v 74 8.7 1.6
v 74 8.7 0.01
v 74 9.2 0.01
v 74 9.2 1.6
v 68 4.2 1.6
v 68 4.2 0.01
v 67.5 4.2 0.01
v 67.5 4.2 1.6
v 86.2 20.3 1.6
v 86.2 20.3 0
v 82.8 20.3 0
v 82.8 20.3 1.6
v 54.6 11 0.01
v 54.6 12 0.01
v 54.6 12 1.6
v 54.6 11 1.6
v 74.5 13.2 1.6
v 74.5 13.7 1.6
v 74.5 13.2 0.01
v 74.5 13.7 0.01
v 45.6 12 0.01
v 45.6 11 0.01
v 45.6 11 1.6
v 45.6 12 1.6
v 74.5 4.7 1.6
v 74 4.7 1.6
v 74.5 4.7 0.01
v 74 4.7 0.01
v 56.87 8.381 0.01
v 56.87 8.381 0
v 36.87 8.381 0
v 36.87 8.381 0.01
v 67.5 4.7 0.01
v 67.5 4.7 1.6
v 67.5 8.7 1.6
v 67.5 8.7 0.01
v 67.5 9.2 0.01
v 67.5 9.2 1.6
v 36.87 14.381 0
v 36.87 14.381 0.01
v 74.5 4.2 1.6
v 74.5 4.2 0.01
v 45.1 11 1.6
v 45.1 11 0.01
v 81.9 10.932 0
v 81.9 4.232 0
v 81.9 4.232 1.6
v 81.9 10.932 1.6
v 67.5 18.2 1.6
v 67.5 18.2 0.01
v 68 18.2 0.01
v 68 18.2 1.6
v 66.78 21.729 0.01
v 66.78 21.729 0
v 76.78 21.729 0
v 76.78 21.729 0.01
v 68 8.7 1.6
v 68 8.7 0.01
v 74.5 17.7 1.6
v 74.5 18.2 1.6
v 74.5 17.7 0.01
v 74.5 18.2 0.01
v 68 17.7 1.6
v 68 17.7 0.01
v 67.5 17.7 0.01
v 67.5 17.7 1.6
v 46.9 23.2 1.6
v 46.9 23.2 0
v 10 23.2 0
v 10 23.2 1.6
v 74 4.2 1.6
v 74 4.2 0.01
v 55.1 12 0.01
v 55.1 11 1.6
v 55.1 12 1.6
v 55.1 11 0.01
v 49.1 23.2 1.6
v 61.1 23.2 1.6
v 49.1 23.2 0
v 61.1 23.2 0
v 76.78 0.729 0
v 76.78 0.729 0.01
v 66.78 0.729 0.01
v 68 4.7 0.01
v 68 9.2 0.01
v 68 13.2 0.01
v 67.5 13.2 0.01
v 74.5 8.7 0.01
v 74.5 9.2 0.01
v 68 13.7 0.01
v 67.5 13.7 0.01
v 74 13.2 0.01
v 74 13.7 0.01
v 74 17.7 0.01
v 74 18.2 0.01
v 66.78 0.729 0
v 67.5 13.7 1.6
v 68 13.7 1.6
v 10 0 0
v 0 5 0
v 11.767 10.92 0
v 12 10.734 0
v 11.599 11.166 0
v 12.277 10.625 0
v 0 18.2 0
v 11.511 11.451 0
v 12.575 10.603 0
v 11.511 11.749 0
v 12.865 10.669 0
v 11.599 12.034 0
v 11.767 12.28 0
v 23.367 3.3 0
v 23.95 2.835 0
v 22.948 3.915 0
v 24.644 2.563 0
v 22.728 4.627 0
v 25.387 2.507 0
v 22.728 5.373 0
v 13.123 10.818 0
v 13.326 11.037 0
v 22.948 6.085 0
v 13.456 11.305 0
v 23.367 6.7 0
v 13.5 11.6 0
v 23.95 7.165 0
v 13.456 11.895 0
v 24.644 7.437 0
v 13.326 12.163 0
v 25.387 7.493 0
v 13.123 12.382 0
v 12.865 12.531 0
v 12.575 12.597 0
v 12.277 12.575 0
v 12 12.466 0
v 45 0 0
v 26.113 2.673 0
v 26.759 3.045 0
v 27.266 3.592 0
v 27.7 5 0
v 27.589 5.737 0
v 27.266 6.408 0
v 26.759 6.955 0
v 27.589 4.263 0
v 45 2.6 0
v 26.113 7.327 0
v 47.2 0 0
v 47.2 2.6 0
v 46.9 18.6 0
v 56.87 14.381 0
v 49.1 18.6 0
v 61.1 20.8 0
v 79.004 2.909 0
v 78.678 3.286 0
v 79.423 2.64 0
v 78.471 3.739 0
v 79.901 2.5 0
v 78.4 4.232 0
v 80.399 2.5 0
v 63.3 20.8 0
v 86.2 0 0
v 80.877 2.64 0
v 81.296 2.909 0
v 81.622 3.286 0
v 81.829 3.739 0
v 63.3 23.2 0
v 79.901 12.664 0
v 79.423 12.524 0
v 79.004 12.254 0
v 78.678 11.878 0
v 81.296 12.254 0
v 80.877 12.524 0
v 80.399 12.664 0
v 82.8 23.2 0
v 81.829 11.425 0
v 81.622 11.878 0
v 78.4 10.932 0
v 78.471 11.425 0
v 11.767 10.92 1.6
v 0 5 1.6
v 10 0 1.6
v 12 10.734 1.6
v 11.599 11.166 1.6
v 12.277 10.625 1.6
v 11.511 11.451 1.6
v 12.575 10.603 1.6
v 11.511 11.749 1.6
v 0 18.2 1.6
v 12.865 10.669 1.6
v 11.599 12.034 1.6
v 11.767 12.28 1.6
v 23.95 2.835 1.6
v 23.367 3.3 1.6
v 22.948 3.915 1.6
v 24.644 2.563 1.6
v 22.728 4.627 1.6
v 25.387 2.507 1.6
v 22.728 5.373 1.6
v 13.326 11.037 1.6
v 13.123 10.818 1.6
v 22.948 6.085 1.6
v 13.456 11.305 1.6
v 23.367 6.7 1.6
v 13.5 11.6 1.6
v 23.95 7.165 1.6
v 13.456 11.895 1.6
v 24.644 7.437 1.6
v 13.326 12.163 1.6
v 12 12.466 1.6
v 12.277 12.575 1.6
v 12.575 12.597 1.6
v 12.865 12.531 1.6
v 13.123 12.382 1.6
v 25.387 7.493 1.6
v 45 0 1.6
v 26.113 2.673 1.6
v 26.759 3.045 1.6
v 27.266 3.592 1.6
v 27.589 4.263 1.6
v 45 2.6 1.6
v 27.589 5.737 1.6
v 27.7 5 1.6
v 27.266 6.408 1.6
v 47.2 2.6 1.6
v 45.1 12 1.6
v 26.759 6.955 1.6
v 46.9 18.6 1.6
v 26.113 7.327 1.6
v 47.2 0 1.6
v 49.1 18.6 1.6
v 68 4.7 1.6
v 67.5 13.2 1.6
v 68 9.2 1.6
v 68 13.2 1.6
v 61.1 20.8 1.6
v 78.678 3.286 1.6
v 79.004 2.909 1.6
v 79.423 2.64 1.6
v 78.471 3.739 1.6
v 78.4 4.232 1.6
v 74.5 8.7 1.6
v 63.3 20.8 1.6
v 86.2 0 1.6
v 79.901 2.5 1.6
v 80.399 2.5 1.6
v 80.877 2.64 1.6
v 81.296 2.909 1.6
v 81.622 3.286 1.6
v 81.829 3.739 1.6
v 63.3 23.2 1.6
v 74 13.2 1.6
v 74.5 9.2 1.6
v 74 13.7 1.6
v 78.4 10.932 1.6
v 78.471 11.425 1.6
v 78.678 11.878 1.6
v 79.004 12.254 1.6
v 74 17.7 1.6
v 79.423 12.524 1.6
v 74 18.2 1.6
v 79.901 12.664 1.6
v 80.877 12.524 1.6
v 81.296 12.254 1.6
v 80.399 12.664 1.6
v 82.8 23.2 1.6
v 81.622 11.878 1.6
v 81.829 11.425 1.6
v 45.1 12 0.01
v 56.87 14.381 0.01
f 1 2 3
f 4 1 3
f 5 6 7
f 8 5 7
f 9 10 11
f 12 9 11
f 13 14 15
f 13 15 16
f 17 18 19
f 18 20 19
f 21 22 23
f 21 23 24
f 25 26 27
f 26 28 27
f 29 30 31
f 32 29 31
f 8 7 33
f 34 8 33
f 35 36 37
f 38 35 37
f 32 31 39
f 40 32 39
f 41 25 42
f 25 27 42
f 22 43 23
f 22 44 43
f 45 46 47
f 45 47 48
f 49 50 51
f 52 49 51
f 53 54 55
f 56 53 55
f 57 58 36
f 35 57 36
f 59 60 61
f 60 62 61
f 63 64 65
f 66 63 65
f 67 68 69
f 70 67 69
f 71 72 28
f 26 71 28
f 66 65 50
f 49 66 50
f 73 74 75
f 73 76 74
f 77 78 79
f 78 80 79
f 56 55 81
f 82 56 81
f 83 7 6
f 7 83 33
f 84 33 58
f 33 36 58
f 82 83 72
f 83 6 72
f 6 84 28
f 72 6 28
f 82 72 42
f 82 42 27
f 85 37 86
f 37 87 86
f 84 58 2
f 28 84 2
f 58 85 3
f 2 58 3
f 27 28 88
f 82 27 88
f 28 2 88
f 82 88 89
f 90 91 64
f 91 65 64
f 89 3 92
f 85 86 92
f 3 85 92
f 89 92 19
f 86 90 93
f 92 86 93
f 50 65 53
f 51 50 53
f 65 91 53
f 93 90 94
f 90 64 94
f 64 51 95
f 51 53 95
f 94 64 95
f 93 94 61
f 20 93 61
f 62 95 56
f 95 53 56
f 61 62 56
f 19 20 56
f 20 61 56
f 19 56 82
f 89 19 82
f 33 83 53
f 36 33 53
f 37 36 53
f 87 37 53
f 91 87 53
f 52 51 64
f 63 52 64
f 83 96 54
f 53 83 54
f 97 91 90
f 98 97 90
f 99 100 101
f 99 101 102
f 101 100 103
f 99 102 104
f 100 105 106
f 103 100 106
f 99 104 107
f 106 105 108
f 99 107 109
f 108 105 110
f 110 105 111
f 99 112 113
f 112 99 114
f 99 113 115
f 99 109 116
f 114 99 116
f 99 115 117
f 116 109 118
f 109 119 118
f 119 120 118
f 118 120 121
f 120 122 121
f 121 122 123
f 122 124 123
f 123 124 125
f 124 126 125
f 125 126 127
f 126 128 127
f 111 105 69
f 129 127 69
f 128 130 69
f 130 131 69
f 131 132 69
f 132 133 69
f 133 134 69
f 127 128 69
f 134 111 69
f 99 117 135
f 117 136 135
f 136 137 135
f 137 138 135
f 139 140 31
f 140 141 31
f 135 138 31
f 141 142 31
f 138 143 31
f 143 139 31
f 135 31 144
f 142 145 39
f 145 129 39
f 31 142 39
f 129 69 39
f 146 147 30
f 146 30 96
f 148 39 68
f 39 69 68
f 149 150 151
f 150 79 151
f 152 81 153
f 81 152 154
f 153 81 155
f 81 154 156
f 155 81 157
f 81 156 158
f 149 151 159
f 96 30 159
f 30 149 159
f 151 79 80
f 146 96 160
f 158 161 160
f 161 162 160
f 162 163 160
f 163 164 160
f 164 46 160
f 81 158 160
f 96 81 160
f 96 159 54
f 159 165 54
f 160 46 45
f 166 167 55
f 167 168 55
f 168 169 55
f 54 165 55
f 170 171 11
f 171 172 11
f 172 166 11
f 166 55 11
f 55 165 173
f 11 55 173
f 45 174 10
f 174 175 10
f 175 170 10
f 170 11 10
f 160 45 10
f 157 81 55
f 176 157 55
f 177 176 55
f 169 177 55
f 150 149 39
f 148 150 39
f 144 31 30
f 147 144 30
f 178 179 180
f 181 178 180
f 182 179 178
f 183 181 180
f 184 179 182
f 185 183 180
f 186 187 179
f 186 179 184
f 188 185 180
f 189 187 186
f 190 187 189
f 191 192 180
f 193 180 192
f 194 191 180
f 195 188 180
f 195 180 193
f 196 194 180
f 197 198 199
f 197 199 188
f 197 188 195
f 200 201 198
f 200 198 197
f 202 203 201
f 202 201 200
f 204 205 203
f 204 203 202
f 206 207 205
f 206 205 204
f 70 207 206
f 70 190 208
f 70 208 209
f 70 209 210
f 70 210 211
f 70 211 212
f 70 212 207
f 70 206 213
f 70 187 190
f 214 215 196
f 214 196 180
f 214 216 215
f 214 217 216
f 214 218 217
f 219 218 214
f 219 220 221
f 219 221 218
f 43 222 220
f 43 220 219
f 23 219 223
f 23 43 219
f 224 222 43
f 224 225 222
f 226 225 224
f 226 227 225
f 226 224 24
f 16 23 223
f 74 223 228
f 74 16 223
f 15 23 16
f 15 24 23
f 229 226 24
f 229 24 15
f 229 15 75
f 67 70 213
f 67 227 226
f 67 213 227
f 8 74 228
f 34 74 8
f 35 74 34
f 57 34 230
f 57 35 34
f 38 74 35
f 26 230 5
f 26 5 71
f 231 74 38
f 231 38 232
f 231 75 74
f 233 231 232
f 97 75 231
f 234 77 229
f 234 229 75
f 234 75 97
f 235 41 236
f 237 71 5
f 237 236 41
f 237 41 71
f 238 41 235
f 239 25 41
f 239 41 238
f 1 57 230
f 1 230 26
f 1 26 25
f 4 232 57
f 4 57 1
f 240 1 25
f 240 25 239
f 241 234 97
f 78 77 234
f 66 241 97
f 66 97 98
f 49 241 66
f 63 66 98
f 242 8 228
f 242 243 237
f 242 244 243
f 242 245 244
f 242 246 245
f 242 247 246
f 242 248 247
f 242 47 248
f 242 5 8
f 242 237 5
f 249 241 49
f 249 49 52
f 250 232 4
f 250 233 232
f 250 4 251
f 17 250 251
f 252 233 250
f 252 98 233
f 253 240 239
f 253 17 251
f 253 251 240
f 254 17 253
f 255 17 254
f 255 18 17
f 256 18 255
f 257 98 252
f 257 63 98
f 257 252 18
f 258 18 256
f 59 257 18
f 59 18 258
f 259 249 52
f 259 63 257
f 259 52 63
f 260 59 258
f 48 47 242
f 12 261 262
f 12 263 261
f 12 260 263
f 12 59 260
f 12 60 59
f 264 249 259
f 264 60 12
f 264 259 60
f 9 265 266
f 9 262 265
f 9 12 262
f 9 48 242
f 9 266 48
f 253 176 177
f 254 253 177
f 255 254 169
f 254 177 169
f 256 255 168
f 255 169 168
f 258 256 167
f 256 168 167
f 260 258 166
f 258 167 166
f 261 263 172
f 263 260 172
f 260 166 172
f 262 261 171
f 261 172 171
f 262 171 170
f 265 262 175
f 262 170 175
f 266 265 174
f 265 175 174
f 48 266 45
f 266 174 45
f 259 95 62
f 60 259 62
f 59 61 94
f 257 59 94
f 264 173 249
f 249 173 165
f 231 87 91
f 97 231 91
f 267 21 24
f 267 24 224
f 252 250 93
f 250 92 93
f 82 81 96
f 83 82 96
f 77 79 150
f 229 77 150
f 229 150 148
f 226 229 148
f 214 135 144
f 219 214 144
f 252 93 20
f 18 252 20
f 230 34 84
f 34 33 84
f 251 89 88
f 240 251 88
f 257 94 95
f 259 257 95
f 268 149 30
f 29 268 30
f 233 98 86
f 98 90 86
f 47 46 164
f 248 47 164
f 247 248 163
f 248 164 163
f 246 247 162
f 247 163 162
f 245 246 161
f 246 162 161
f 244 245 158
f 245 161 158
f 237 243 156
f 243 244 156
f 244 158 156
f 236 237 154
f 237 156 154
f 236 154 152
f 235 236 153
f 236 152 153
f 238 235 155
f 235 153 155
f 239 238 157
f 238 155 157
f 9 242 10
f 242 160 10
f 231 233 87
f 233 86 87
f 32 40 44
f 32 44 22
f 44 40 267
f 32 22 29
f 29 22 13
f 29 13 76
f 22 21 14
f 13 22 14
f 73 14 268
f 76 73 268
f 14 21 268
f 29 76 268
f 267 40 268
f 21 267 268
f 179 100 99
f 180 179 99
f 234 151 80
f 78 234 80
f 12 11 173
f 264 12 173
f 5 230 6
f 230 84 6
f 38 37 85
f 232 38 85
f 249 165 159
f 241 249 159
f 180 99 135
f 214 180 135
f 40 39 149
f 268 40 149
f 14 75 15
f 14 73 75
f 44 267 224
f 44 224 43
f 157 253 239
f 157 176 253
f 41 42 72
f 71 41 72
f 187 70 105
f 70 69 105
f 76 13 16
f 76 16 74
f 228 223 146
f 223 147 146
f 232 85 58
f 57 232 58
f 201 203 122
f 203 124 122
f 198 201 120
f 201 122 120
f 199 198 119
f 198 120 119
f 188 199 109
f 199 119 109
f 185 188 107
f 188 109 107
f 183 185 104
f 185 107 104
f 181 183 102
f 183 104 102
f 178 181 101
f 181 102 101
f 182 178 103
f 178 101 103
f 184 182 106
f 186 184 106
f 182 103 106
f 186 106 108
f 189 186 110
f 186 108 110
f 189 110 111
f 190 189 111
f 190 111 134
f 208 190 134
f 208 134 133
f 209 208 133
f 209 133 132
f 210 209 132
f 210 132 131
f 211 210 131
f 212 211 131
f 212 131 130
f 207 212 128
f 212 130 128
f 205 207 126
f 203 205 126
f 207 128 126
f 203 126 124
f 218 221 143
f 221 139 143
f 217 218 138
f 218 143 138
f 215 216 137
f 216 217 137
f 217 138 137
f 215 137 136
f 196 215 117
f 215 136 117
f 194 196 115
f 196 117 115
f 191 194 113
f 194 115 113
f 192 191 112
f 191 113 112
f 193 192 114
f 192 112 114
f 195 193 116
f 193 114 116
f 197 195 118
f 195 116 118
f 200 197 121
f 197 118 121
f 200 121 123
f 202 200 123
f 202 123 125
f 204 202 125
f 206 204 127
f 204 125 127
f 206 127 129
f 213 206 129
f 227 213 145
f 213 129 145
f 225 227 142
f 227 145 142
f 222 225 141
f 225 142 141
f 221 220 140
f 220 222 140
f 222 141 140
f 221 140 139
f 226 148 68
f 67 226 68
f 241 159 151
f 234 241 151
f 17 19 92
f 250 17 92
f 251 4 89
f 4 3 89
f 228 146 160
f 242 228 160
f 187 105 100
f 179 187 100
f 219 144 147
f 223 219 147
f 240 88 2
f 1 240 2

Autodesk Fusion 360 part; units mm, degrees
sketch "Sketch1" plane through (0, 0, 0) normal (0, 0, 1) x (1, 0, 0) in component "Component"
  line L0 (0, 23.2) -> (86.2, 23.2) construction
  line L1 (86.2, 23.2) -> (86.2, 0) construction
  line L2 (86.2, 0) -> (0, 0) construction
  line L3 (0, 0) -> (0, 23.2) construction
  line L4 (86.2, 20.3) -> (82.8, 20.3)
  line L5 (82.8, 20.3) -> (82.8, 23.2)
  line L6 (82.8, 23.2) -> (63.2045, 23.2)
  line L7 (63.3, 23.2) -> (63.3, 20.8)
  line L8 (63.3, 20.8) -> (61.1, 20.8)
  line L9 (61.1, 20.8) -> (61.1, 23.2)
  line L10 (61.1, 23.2) -> (49.1, 23.2)
  line L11 (49.1, 23.2) -> (49.1, 18.6)
  line L12 (49.1, 18.6) -> (46.9, 18.6)
  line L13 (46.9, 18.6) -> (46.9, 23.2)
  line L14 (46.9, 23.2) -> (10, 23.2)
  line L15 (10, 23.2) -> (0, 18.2)
  line L16 (0, 18.2) -> (0, 5)
  line L17 (0, 5) -> (10, 0)
  line L18 (10, 0) -> (45, 0)
  line L19 (45, 0) -> (45, 2.6)
  line L20 (45, 2.6) -> (47.2, 2.6)
  line L21 (47.2, 2.6) -> (47.2, 0)
  line L22 (47.2, 0) -> (86.2, 0)
  line L23 (86.2, 0) -> (86.2, 20.3)
  circle A0 centre (25.2, 5) radius 2.5
  line L24 (78.4, 10.9318) -> (78.4, 4.2318)
  arc A1 (78.4, 4.2318) -> (81.9, 4.2318) centre (80.15, 4.2318) ccw
  line L25 (81.9, 4.2318) -> (81.9, 10.9318)
  arc A2 (81.9, 10.9318) -> (78.4, 10.9318) centre (80.15, 10.9318) ccw
  line L26 (55.1, 12) -> (54.6, 12)
  line L27 (54.6, 12) -> (54.6, 11)
  line L28 (54.6, 11) -> (55.1, 11)
  line L29 (55.1, 11) -> (55.1, 12)
  line L30 (74, 18.2) -> (74.5, 18.2)
  line L31 (74.5, 18.2) -> (74.5, 17.7)
  line L32 (74.5, 17.7) -> (74, 17.7)
  line L33 (74, 17.7) -> (74, 18.2)
  circle A3 centre (12.5, 11.6) radius 1
  line L34 (36.8702, 14.3809) -> (56.8702, 14.3809)
  line L35 (56.8702, 14.3809) -> (56.8702, 8.3809)
  line L36 (56.8702, 8.3809) -> (36.8702, 8.3809)
  line L37 (36.8702, 8.3809) -> (36.8702, 14.3809)
  line L38 (66.7799, 21.7291) -> (76.7799, 21.7291)
  line L39 (76.7799, 21.7291) -> (76.7799, 0.7291)
  line L40 (76.7799, 0.7291) -> (66.7799, 0.7291)
  line L41 (66.7799, 0.7291) -> (66.7799, 21.7291)
  dimension "d1" = 86.2
  dimension "d2" = 23.2
  dimension "d3" = 2.2
  dimension "d4" = 2.2
  dimension "d5" = 4.6
  dimension "d6" = 2.4
  dimension "d7" = 2.2
  dimension "d8" = 2.6
  dimension "d9" = 3.4
  dimension "d10" = 2.9
  dimension "d11" = 10
  dimension "d12" = 5
  dimension "d13" = 25.2
  dimension "d14" = 5
  dimension "d15" = 5
  dimension "d16" = 45
  dimension "d17" = 46.9
  dimension "d18" = 61.1
  dimension "d19" = 6.7
  dimension "d20" = 4.3
  dimension "d21" = 4.2318
  dimension "d22" = 1.75
  dimension "d23" = 0.5
  dimension "d24" = 55.1
  dimension "d25" = 1
  dimension "d26" = 12
  dimension "d27" = 0.5
  dimension "d28" = 0.5
  dimension "d29" = 74.5
  dimension "d30" = 5
  dimension "d33" = 80.15
  dimension "d34" = 2
  dimension "d35" = 12.5
  dimension "d36" = 11.6
  dimension "d48" = 20
  dimension "d49" = 6
  dimension "d50" = 10
  dimension "d51" = 21
extrude "Extrude1" add sketch "Sketch1" along normal blind 1.6 contours L4 L5 L6 L7 L8 L9 L10 L11 L12 L13 L14 L15 L16 L17 L18 L19 L20 L21 L22 L23 | L26 L27 L28 L29 | L30 L31 L32 L33 | A3 | L34 L35 L36 L37 | L38 L39 L40 L41 in component "Component"
extrude "Extrude2" cut sketch "Sketch1" along normal through all contours L26 L27 L28 L29 in component "Component"
extrude "Extrude3" cut sketch "Sketch1" along normal through all contours L30 L31 L32 L33 in component "Component"
pattern_linear "R-Pattern1" count 2 spacing 6.5 along (-1, 0, 0) count 4 spacing 4.5 along (0, -1, 0) of "Extrude3" in component "Component"
extrude "Extrude4" cut sketch "Sketch1" along normal through all contours A3 in component "Component"
pattern_linear "R-Pattern2" count 2 spacing 9.5 along (-1, 0, 0) of "Extrude2" in component "Component"
extrude "Extrude5" cut sketch "Sketch1" along normal blind 0.01 contours L34 L35 L36 L37 | L38 L39 L40 L41 in component "Component"
component "Component" placed x (1, 0, 0) y (0, 1, 0) z (0, 0, 1) at (0, 0, 0)
equation "d36 = d2 / 2"
